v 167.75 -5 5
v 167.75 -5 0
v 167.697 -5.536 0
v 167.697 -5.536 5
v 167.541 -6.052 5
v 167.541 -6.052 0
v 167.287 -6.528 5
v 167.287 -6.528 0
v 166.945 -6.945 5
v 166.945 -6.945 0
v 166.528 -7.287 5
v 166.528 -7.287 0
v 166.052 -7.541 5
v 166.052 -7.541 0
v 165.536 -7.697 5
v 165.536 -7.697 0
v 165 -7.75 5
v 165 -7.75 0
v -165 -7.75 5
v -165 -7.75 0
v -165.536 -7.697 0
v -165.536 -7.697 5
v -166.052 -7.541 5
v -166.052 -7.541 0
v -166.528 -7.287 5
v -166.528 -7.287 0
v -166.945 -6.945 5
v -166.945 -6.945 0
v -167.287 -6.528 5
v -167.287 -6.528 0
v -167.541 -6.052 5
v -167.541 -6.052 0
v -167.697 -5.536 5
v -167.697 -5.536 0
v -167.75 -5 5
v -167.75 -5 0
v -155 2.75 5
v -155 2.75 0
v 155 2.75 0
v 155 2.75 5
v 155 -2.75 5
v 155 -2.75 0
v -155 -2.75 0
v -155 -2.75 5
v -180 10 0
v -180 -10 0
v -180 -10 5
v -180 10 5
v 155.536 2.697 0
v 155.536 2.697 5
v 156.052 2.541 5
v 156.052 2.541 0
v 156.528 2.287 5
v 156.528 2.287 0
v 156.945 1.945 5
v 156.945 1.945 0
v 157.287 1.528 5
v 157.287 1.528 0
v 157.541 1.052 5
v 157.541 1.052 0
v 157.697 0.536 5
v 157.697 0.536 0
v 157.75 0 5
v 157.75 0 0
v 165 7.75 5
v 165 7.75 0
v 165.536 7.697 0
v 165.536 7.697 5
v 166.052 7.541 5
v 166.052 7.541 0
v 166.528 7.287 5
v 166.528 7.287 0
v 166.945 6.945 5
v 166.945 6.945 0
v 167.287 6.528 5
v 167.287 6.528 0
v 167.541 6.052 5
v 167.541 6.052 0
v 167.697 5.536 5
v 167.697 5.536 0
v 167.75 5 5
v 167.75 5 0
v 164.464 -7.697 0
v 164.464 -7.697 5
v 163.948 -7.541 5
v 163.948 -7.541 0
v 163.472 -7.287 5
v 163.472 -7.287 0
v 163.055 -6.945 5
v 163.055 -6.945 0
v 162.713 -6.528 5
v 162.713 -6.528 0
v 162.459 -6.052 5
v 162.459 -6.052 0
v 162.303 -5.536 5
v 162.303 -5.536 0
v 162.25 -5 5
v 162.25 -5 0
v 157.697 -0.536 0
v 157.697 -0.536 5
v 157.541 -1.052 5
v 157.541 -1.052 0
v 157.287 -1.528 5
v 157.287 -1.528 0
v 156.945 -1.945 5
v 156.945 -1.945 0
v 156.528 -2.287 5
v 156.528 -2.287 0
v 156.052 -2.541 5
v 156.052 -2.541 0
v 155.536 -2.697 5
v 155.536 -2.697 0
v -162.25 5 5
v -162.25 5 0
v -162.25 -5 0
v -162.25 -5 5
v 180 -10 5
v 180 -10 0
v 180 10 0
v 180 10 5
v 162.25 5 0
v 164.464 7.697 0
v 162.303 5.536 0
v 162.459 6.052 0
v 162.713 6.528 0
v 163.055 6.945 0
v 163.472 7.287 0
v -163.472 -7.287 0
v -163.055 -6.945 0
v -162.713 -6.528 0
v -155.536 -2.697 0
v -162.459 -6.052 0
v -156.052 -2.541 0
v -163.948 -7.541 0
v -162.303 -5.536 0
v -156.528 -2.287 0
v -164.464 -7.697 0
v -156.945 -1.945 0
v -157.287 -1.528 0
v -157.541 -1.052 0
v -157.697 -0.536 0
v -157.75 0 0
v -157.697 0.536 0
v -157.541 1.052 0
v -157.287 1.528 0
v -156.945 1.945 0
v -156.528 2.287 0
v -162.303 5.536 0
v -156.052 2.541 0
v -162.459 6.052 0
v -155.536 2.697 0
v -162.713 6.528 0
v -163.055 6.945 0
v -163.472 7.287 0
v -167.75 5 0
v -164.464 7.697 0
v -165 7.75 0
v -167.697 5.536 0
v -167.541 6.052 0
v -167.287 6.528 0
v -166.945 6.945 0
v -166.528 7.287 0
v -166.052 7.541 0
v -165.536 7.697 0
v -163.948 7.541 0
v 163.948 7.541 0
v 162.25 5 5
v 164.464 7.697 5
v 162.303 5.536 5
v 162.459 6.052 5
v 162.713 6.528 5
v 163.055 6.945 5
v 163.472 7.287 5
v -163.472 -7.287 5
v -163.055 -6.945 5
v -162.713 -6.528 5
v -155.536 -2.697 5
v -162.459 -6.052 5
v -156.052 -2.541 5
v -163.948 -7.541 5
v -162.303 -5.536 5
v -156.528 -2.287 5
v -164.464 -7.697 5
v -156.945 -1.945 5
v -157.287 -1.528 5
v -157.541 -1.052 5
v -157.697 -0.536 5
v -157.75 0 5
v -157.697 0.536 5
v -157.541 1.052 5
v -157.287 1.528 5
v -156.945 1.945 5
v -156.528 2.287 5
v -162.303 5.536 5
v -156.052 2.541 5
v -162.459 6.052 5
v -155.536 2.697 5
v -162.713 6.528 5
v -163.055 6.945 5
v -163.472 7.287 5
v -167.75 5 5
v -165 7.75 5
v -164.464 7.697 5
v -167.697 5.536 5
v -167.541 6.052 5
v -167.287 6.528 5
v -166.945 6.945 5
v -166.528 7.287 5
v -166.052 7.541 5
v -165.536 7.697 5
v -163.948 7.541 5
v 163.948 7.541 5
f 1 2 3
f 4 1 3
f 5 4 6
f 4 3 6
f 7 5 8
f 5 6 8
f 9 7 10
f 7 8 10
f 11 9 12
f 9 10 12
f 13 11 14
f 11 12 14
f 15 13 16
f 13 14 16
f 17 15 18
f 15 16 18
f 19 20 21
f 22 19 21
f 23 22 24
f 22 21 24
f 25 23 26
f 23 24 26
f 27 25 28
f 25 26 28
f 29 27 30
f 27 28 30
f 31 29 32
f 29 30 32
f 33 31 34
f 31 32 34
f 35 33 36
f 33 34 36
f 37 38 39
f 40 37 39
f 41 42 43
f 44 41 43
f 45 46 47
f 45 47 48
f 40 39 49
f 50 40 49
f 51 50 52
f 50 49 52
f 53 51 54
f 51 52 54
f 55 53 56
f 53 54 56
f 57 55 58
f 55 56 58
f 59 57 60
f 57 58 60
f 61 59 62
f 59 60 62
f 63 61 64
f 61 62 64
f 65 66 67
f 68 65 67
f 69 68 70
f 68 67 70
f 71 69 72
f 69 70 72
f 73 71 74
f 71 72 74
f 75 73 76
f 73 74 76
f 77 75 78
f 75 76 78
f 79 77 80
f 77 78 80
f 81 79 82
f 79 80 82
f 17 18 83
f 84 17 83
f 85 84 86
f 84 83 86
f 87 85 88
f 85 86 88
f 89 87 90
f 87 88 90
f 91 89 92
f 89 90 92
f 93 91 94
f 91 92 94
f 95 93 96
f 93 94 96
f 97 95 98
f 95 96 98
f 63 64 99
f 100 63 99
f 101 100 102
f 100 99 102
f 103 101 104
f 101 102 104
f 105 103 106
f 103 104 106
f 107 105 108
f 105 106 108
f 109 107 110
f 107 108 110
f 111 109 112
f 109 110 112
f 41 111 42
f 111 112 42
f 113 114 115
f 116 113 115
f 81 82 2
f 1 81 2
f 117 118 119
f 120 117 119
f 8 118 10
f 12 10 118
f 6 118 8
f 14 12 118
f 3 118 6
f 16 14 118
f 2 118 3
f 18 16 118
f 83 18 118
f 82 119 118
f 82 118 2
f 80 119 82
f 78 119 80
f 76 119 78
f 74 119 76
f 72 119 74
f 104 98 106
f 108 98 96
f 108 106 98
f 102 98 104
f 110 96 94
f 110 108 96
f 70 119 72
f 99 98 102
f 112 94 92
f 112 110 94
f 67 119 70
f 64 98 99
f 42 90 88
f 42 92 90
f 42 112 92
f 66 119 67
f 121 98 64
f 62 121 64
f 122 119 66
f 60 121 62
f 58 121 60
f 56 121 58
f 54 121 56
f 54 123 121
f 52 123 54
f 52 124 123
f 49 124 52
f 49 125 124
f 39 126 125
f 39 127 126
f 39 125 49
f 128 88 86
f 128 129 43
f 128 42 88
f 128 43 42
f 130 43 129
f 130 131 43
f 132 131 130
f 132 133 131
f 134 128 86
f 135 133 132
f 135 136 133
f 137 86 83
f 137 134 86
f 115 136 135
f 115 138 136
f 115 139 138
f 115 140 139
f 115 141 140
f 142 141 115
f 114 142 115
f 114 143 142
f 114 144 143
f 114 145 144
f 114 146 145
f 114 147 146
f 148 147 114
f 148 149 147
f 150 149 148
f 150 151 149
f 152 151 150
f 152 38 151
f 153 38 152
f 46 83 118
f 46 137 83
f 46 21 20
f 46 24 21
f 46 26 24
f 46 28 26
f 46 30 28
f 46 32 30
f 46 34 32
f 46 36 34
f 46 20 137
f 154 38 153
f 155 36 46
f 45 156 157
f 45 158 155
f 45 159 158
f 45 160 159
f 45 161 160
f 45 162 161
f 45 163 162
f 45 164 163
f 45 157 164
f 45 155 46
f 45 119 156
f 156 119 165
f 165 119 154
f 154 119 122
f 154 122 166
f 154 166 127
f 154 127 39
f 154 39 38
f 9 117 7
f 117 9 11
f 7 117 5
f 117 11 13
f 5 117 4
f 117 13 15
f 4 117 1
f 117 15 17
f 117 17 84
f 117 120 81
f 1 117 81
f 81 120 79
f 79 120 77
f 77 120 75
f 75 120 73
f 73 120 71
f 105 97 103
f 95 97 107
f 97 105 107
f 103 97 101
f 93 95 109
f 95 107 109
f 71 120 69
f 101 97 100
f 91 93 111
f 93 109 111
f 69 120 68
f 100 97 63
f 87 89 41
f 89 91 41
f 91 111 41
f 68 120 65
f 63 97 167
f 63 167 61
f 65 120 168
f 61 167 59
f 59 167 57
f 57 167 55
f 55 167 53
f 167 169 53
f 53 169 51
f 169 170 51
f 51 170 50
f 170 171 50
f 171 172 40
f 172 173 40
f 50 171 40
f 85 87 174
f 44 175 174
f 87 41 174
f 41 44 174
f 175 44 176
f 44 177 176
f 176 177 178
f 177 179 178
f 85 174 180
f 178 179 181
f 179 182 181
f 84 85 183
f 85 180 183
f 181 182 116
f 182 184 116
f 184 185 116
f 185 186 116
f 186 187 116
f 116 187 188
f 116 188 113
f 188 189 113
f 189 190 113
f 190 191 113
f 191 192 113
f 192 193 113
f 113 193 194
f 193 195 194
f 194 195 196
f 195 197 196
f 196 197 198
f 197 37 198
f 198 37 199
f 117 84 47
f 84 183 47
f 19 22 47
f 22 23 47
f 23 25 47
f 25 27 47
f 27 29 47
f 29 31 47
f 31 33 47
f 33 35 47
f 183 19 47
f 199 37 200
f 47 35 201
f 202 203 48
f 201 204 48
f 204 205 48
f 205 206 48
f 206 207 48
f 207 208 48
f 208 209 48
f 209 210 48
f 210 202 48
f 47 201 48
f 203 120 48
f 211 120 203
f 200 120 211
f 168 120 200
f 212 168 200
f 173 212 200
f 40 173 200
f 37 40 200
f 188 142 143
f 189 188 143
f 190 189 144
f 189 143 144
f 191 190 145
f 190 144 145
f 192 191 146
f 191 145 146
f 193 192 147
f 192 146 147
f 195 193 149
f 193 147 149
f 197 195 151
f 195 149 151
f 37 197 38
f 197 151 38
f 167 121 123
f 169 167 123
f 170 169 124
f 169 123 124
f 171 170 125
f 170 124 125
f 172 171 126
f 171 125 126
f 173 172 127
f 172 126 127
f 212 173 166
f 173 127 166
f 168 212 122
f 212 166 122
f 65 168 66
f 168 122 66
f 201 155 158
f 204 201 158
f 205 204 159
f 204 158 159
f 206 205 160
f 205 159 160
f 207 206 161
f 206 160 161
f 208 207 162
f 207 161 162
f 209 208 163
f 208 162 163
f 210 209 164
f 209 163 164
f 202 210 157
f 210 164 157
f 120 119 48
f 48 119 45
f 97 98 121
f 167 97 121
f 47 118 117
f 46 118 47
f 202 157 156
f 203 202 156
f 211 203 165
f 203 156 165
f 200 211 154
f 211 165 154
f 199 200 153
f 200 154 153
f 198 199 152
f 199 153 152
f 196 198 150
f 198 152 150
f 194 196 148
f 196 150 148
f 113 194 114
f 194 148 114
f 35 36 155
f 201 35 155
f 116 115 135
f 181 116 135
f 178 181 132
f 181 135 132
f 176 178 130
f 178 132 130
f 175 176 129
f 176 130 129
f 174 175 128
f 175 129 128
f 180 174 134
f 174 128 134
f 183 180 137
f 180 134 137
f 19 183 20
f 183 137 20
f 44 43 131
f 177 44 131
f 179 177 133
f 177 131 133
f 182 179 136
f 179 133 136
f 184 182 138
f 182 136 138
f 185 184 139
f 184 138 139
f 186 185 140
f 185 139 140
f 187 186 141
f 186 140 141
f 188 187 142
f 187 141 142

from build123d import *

# Parameters (mm, degrees)
EXTRUDE_1_DEPTH     = 5
CUT_EXTRUDE_1_DEPTH = 5
SKETCH_4_W          = 5
SKETCH_4_H          = 20
EXTRUDE_2_DEPTH     = 5


with BuildPart() as part:
    # 草图1 → 凸台-拉伸1 (new body)
    with BuildSketch(Plane.XY):
        Polygon((175, 10), (0, 10), (-175, 10), (-175, -10), (175, -10), align=None)
    extrude(amount=EXTRUDE_1_DEPTH)

    # 草图3 → 切除-拉伸1 (cut)
    with BuildSketch(Plane(origin=(0, 0, 0), x_dir=(-1, 0, 0), z_dir=(0, 0, -1))):
        with BuildLine():
            Line((-165, 5), (-165, 0))
            Line((-165, 0), (-162.25, 0))
            Line((-162.25, 0), (-162.25, 5))
            ThreePointArc((-162.25, 5), (-163.055456352, 6.944543648), (-165, 7.75))
            Line((-165, 7.75), (-165, 5))
        make_face()
        with BuildLine():
            Line((-167.75, 5), (-167.75, 0))
            Line((-167.75, 0), (-165, 0))
            Line((-165, 0), (-165, 5))
            Line((-165, 5), (-165, 7.75))
            ThreePointArc((-165, 7.75), (-166.944543648, 6.944543648), (-167.75, 5))
        make_face()
        with BuildLine():
            Line((-165, 0), (-167.75, 0))
            Line((-167.75, 0), (-167.75, -5))
            ThreePointArc((-167.75, -5), (-166.944543648, -6.944543648), (-165, -7.75))
            Line((-165, -7.75), (-165, -5))
            Line((-165, -5), (-165, 0))
        make_face()
        with BuildLine():
            Line((-162.25, 0), (-165, 0))
            Line((-165, 0), (-165, -5))
            Line((-165, -5), (-165, -7.75))
            ThreePointArc((-165, -7.75), (-163.055456352, -6.944543648), (-162.25, -5))
            Line((-162.25, -5), (-162.25, 0))
        make_face()
        with BuildLine():
            Line((-155, 0), (-157.75, 0))
            ThreePointArc((-157.75, 0), (-156.944543648, -1.944543648), (-155, -2.75))
            Line((-155, -2.75), (155, -2.75))
            ThreePointArc((155, -2.75), (156.944543648, -1.944543648), (157.75, 0))
            Line((157.75, 0), (155, 0))
            Line((155, 0), (-155, 0))
        make_face()
        with BuildLine():
            ThreePointArc((-155, 2.75), (-156.944543648, 1.944543648), (-157.75, 0))
            Line((-157.75, 0), (-155, 0))
            Line((-155, 0), (155, 0))
            Line((155, 0), (157.75, 0))
            ThreePointArc((157.75, 0), (156.944543648, 1.944543648), (155, 2.75))
            Line((155, 2.75), (-155, 2.75))
        make_face()
        with BuildLine():
            Line((165, 5), (165, 0))
            Line((165, 0), (167.75, 0))
            Line((167.75, 0), (167.75, 5))
            ThreePointArc((167.75, 5), (166.944543648, 6.944543648), (165, 7.75))
            Line((165, 7.75), (165, 5))
        make_face()
        with BuildLine():
            Line((162.25, 5), (162.25, 0))
            Line((162.25, 0), (165, 0))
            Line((165, 0), (165, 5))
            Line((165, 5), (165, 7.75))
            ThreePointArc((165, 7.75), (163.055456352, 6.944543648), (162.25, 5))
        make_face()
        with BuildLine():
            Line((165, 0), (162.25, 0))
            Line((162.25, 0), (162.25, -5))
            ThreePointArc((162.25, -5), (163.055456352, -6.944543648), (165, -7.75))
            Line((165, -7.75), (165, -5))
            Line((165, -5), (165, 0))
        make_face()
        with BuildLine():
            Line((167.75, 0), (165, 0))
            Line((165, 0), (165, -5))
            Line((165, -5), (165, -7.75))
            ThreePointArc((165, -7.75), (166.944543648, -6.944543648), (167.75, -5))
            Line((167.75, -5), (167.75, 0))
        make_face()
    extrude(amount=-CUT_EXTRUDE_1_DEPTH, mode=Mode.SUBTRACT)

    # 草图4 → 凸台-拉伸2 (add)
    with BuildSketch(Plane(origin=(0, 0, 0), x_dir=(-1, 0, 0), z_dir=(0, 0, -1))):
        with Locations((-177.5, 0)):
            Rectangle(SKETCH_4_W, SKETCH_4_H)
        with Locations((177.5, 0)):
            Rectangle(SKETCH_4_W, SKETCH_4_H)
    extrude(amount=-EXTRUDE_2_DEPTH)


solid = part.part
